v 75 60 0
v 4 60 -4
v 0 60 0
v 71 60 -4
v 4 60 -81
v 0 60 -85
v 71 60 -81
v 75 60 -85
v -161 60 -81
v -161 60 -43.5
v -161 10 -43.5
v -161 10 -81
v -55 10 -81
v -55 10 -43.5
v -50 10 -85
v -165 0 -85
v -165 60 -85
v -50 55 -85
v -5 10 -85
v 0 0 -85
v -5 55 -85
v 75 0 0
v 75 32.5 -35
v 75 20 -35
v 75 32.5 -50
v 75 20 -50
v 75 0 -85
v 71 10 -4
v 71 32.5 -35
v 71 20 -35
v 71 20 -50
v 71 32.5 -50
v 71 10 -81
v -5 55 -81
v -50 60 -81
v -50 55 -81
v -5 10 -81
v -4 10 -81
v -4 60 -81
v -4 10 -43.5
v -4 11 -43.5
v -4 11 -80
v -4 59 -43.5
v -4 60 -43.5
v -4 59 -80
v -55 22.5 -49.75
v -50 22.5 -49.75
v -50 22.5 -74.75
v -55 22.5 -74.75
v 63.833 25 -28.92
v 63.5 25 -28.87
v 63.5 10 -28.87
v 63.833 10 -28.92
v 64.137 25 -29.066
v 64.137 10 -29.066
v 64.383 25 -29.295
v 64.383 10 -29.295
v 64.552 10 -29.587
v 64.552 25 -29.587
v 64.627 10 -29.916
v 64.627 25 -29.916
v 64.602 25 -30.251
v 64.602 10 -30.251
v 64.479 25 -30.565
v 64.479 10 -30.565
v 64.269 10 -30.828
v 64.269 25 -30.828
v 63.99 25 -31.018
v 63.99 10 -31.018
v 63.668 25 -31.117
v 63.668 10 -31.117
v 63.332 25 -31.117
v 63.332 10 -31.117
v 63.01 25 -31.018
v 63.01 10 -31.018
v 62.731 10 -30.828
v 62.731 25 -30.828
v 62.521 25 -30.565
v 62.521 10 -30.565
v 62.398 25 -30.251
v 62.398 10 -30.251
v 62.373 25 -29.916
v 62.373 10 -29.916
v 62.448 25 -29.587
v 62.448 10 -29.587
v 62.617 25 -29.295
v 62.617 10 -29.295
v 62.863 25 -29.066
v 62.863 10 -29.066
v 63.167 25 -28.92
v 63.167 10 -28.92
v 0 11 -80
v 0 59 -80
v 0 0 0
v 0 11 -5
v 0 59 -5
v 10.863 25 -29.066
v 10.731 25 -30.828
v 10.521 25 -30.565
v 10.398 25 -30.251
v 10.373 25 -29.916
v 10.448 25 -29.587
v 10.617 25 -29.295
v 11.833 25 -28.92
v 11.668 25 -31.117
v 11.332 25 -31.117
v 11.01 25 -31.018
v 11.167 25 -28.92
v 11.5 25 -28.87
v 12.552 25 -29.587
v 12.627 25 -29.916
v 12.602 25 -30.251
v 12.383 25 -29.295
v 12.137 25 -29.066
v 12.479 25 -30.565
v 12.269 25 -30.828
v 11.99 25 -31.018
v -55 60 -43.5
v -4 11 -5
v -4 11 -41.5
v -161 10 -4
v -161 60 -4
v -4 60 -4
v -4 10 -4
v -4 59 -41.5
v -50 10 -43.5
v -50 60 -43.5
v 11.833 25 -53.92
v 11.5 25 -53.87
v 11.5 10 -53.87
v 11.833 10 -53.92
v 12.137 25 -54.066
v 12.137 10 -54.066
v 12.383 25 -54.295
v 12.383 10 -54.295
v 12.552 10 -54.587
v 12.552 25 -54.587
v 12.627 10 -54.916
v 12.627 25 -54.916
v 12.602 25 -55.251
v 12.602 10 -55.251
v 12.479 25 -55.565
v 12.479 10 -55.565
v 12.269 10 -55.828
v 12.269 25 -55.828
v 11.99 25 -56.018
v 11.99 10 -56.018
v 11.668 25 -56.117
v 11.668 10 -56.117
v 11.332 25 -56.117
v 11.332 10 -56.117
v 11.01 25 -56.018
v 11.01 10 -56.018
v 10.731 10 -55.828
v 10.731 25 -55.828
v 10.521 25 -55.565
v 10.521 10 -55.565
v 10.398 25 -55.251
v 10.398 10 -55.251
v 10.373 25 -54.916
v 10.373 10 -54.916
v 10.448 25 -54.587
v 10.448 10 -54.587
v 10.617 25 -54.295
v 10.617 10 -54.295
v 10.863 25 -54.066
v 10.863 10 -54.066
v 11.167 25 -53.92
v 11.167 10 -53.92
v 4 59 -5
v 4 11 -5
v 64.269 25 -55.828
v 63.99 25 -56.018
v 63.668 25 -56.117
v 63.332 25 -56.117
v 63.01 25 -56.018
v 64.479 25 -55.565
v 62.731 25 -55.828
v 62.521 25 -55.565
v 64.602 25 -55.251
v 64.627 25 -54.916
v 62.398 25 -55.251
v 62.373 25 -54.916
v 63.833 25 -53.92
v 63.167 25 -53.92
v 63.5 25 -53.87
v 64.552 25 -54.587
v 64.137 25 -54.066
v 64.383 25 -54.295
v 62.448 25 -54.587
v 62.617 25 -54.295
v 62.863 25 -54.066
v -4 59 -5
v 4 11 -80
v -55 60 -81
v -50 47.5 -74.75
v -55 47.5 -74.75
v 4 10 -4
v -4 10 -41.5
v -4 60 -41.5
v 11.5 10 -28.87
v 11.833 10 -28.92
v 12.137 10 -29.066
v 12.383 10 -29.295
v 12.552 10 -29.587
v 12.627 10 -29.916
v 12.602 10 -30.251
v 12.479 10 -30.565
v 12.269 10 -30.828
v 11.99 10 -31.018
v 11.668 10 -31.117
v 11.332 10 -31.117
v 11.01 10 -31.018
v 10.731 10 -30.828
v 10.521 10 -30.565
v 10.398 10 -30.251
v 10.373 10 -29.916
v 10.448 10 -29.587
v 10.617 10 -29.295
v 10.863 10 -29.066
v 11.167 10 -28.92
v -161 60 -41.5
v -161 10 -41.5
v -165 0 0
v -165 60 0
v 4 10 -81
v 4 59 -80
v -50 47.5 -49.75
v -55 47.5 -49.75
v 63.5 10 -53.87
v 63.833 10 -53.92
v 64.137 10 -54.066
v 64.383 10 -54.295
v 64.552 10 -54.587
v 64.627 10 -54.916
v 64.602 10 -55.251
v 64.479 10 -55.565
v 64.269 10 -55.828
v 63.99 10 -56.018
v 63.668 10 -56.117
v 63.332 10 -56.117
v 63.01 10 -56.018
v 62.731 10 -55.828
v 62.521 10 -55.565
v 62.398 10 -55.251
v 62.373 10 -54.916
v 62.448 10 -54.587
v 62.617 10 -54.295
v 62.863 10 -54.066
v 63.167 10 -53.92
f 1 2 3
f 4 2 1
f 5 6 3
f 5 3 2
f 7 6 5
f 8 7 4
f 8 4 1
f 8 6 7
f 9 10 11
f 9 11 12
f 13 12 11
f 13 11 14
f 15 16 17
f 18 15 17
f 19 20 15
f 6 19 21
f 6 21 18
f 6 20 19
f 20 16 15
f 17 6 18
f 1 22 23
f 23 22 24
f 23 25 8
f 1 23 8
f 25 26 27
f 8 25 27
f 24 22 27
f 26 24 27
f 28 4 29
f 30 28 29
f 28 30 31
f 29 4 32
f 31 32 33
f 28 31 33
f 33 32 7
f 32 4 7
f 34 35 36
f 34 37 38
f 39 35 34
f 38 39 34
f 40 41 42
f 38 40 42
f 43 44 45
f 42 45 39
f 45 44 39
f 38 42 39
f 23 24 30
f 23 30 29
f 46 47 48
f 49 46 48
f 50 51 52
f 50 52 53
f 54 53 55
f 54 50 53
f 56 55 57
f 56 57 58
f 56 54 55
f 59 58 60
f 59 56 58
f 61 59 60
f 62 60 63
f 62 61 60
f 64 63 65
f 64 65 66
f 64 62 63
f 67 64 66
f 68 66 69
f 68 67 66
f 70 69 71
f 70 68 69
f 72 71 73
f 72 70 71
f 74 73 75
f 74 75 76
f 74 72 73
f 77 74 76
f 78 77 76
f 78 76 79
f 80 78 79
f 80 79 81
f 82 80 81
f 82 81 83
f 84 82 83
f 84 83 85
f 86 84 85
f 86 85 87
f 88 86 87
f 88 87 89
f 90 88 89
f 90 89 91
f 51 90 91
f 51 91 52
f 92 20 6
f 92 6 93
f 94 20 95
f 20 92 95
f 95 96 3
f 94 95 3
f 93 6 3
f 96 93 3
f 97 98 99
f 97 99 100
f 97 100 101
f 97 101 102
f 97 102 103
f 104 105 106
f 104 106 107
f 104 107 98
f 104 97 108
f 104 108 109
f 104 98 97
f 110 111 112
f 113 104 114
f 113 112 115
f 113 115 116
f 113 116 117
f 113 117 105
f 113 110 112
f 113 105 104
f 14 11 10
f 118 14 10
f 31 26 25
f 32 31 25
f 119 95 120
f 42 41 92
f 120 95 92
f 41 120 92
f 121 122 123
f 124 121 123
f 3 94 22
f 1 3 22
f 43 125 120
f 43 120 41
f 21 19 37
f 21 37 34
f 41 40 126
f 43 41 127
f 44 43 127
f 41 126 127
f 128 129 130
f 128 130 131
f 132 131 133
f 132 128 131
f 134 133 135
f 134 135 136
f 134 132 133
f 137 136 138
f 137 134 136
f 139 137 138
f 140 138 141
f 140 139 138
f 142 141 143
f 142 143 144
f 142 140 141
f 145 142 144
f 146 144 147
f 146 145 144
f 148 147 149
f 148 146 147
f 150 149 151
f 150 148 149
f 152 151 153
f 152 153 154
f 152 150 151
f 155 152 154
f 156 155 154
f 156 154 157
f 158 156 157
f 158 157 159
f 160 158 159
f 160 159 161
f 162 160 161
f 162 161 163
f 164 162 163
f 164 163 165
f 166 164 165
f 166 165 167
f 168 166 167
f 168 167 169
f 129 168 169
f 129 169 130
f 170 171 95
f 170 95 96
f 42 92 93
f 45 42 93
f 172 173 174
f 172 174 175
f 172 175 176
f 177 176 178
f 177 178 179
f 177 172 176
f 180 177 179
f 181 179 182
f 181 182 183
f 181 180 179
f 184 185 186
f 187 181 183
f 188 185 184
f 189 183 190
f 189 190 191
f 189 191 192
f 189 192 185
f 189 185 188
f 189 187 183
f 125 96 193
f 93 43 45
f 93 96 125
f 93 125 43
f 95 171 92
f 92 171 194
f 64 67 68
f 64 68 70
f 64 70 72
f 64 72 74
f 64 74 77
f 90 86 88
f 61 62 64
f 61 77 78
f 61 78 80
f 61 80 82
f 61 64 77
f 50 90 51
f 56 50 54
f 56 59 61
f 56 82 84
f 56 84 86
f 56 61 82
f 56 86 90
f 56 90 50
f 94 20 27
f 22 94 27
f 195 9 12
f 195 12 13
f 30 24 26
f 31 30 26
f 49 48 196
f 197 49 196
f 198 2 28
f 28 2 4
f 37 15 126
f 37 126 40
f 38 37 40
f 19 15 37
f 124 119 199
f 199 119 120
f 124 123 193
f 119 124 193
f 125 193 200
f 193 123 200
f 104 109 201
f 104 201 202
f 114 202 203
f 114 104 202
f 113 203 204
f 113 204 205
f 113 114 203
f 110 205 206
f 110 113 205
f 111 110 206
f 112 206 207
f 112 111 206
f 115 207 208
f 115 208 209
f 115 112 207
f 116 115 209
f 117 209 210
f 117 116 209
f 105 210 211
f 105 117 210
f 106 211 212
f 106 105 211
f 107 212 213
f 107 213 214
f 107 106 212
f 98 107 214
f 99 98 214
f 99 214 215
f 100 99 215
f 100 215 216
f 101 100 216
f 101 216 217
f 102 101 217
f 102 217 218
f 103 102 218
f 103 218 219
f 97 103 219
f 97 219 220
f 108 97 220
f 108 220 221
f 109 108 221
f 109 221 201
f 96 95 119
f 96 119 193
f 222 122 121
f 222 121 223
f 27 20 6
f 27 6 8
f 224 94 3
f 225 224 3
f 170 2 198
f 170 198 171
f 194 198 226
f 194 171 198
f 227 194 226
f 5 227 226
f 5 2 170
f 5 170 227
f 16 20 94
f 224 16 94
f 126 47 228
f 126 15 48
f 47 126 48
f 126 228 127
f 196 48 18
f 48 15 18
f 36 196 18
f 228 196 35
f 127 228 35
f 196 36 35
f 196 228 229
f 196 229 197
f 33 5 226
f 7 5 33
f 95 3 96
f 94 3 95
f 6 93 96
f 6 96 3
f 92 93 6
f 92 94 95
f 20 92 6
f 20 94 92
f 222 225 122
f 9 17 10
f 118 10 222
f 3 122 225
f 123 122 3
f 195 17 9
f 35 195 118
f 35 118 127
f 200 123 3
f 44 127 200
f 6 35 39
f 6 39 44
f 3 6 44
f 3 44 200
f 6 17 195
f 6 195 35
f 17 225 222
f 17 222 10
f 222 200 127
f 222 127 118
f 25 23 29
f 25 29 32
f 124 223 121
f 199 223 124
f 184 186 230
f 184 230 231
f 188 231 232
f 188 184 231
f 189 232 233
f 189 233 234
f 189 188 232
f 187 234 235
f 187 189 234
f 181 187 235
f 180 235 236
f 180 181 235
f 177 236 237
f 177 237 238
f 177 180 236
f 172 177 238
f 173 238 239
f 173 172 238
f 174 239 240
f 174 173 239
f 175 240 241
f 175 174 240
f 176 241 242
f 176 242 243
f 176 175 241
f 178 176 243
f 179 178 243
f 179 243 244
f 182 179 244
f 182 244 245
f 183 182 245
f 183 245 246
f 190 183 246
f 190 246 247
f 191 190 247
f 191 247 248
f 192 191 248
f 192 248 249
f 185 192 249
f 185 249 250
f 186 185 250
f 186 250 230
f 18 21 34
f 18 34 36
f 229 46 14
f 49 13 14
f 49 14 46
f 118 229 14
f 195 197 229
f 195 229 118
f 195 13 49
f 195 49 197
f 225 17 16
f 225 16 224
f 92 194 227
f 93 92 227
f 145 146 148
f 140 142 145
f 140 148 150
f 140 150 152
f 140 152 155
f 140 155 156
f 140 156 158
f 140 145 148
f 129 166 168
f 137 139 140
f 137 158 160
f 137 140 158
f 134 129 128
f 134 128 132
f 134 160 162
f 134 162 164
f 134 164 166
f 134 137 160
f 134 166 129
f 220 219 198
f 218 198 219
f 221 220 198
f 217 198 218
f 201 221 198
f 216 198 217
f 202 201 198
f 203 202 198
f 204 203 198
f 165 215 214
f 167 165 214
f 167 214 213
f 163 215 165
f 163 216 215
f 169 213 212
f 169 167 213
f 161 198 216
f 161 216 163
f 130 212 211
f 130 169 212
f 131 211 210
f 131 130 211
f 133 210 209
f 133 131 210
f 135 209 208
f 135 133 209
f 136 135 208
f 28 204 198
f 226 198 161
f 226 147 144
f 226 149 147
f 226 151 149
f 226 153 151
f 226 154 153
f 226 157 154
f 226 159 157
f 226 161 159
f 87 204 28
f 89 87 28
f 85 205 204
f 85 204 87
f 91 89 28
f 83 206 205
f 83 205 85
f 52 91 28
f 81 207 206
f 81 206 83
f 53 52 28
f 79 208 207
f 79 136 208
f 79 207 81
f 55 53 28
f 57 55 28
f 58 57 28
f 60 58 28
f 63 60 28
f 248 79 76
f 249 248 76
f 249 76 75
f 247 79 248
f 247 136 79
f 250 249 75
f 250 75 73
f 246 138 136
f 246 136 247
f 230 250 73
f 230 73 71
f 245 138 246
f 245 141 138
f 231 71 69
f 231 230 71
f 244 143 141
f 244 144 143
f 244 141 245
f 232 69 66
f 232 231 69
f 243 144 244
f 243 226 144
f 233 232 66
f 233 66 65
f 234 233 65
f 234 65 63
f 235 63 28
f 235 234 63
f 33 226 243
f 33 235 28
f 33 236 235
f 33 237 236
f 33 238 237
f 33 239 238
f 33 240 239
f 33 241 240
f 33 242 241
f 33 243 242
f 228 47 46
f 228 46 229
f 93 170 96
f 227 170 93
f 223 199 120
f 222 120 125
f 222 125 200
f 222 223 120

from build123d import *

# Parameters (mm, degrees)
IZIM1_W                     = 75
IZIM1_H                     = 85
Y_KSEKLIK_EKSTR_ZYON1_DEPTH = 60
IZIM3_W                     = 67
IZIM3_H                     = 77
KES_EKSTR_ZYON1_DEPTH       = 50
IZIM4_W                     = 85
IZIM4_H                     = 60
Y_KSEKLIK_EKSTR_ZYON2_DEPTH = 165
IZIM5_W                     = 157
IZIM5_H                     = 77
KES_EKSTR_ZYON2_DEPTH       = 50
IZIM7_W                     = 15
IZIM7_H                     = 12.5
KES_EKSTR_ZYON4_DEPTH       = 4
IZIM8_W                     = 75
IZIM8_H                     = 48
KES_EKSTR_ZYON5_DEPTH       = 10
IZIM9_W                     = 2
IZIM9_H                     = 50
Y_KSEKLIK_EKSTR_ZYON3_DEPTH = 157
IZIM11_R                    = 1.13
KES_EKSTR_ZYON6_DEPTH       = 1
Y_KSEKLIK_EKSTR_ZYON4_START = 16
IZIM12_R                    = 1.13
Y_KSEKLIK_EKSTR_ZYON4_DEPTH = 16
IZIM13_W                    = 45
IZIM13_H                    = 45
KES_EKSTR_ZYON7_DEPTH       = 4
Y_KSEKLIK_EKSTR_ZYON5_REACH = 195.355
IZIM14_W                    = 5
IZIM14_H                    = 50
IZIM15_W                    = 25
IZIM15_H                    = 25
KES_EKSTR_ZYON8_DEPTH       = 5


with BuildPart() as part:
    # Çizim1 → Yükseklik-Ekstrüzyon1 (new body)
    with BuildSketch(Plane(origin=(0, 0, 0), x_dir=(1, 0, 0), z_dir=(0, 1, 0))):
        with Locations((37.5, 42.5)):
            Rectangle(IZIM1_W, IZIM1_H)
    extrude(amount=Y_KSEKLIK_EKSTR_ZYON1_DEPTH)

    # Çizim3 → Kes-Ekstrüzyon1 (cut)
    with BuildSketch(Plane(origin=(0, 60, 0), x_dir=(1, 0, 0), z_dir=(0, 1, 0))):
        with Locations((37.5, 42.5)):
            Rectangle(IZIM3_W, IZIM3_H)
    extrude(amount=-KES_EKSTR_ZYON1_DEPTH, mode=Mode.SUBTRACT)

    # Çizim7 → Kes-Ekstrüzyon4 (cut)
    with BuildSketch(Plane(origin=(75, 0, 0), x_dir=(0, 0, -1), z_dir=(1, 0, 0))):
        with Locations((42.5, 26.25)):
            Rectangle(IZIM7_W, IZIM7_H)
    extrude(amount=-KES_EKSTR_ZYON4_DEPTH, mode=Mode.SUBTRACT)


with BuildPart() as body_2:
    # Çizim4 → Yükseklik-Ekstrüzyon2 (new body)
    with BuildSketch(Plane.ZY):
        with Locations((-42.5, 30)):
            Rectangle(IZIM4_W, IZIM4_H)
    extrude(amount=Y_KSEKLIK_EKSTR_ZYON2_DEPTH)

    # Çizim5 → Kes-Ekstrüzyon2 (cut)
    with BuildSketch(Plane(origin=(0, 60, 0), x_dir=(1, 0, 0), z_dir=(0, 1, 0))):
        with Locations((-82.5, 42.5)):
            Rectangle(IZIM5_W, IZIM5_H)
    extrude(amount=-KES_EKSTR_ZYON2_DEPTH, mode=Mode.SUBTRACT)


with BuildPart() as kes_ekstr_zyon5_tool:
    # Çizim8 → Kes-Ekstrüzyon5 (new body)
    with BuildSketch(Plane(origin=(4, 0, 0), x_dir=(0, 0, -1), z_dir=(1, 0, 0))):
        with Locations((42.5, 35)):
            Rectangle(IZIM8_W, IZIM8_H)
    extrude(amount=-KES_EKSTR_ZYON5_DEPTH)


with BuildPart() as part_1:
    add(part.part)

    # Kes-Ekstrüzyon5: cut by kes_ekstr_zyon5_tool
    add(kes_ekstr_zyon5_tool.part, mode=Mode.SUBTRACT)

    # Çizim11 → Kes-Ekstrüzyon6 (cut)
    with BuildSketch(Plane(origin=(0, 10, 0), x_dir=(1, 0, 0), z_dir=(0, 1, 0))):
        with Locations(Location((11.5, 55, 0), (0, 0, 270))):
            Circle(IZIM11_R)
        with Locations(Location((63.5, 55, 0), (0, 0, 270))):
            Circle(IZIM11_R)
        with Locations(Location((63.5, 30, 0), (0, 0, 270))):
            Circle(IZIM11_R)
        with Locations(Location((11.5, 30, 0), (0, 0, 270))):
            Circle(IZIM11_R)
    extrude(amount=-KES_EKSTR_ZYON6_DEPTH, mode=Mode.SUBTRACT)

    # Çizim12 → Yükseklik-Ekstrüzyon4 (add)
    with BuildSketch(Plane(origin=(0, 9, 0), x_dir=(1, 0, 0), z_dir=(0, 1, 0)).offset(Y_KSEKLIK_EKSTR_ZYON4_START)):
        with Locations(Location((11.5, 55, 0), (0, 0, 270))):
            Circle(IZIM12_R)
        with Locations(Location((63.5, 55, 0), (0, 0, 270))):
            Circle(IZIM12_R)
        with Locations(Location((63.5, 30, 0), (0, 0, 270))):
            Circle(IZIM12_R)
        with Locations(Location((11.5, 30, 0), (0, 0, 270))):
            Circle(IZIM12_R)
    extrude(amount=-Y_KSEKLIK_EKSTR_ZYON4_DEPTH)


with BuildPart() as body_2_1:
    add(body_2.part)

    # Kes-Ekstrüzyon5: cut by kes_ekstr_zyon5_tool
    add(kes_ekstr_zyon5_tool.part, mode=Mode.SUBTRACT)

    # Çizim9 → Yükseklik-Ekstrüzyon3 (add)
    with BuildSketch(Plane(origin=(-161, 0, 0), x_dir=(0, 0, -1), z_dir=(1, 0, 0))):
        with Locations((42.5, 35)):
            Rectangle(IZIM9_W, IZIM9_H)
    extrude(amount=Y_KSEKLIK_EKSTR_ZYON3_DEPTH)

    # Çizim13 → Kes-Ekstrüzyon7 (cut)
    with BuildSketch(Plane(origin=(0, 0, -85), x_dir=(-1, 0, 0), z_dir=(0, 0, -1))):
        with Locations((27.5, 32.5)):
            Rectangle(IZIM13_W, IZIM13_H)
    extrude(amount=-KES_EKSTR_ZYON7_DEPTH, mode=Mode.SUBTRACT)

    # Çizim14 → Yükseklik-Ekstrüzyon5 (add, up to next)
    with BuildSketch(Plane.XY.offset(-81), mode=Mode.PRIVATE) as y_kseklik_ekstr_zyon5_sk1:
        with Locations((-52.5, 35)):
            Rectangle(IZIM14_W, IZIM14_H)
    y_kseklik_ekstr_zyon5_tool1 = extrude(y_kseklik_ekstr_zyon5_sk1.sketch, amount=Y_KSEKLIK_EKSTR_ZYON5_REACH, mode=Mode.PRIVATE) - body_2_1.part
    add(y_kseklik_ekstr_zyon5_tool1.solids().sort_by_distance((-52.5, 35, -81))[0])

    # Çizim15 → Kes-Ekstrüzyon8 (cut)
    with BuildSketch(Plane(origin=(-50, 0, 0), x_dir=(0, 0, -1), z_dir=(1, 0, 0))):
        with Locations((62.25, 35)):
            Rectangle(IZIM15_W, IZIM15_H)
    extrude(amount=-KES_EKSTR_ZYON8_DEPTH, mode=Mode.SUBTRACT)


solid = Compound([part_1.part, body_2_1.part])
